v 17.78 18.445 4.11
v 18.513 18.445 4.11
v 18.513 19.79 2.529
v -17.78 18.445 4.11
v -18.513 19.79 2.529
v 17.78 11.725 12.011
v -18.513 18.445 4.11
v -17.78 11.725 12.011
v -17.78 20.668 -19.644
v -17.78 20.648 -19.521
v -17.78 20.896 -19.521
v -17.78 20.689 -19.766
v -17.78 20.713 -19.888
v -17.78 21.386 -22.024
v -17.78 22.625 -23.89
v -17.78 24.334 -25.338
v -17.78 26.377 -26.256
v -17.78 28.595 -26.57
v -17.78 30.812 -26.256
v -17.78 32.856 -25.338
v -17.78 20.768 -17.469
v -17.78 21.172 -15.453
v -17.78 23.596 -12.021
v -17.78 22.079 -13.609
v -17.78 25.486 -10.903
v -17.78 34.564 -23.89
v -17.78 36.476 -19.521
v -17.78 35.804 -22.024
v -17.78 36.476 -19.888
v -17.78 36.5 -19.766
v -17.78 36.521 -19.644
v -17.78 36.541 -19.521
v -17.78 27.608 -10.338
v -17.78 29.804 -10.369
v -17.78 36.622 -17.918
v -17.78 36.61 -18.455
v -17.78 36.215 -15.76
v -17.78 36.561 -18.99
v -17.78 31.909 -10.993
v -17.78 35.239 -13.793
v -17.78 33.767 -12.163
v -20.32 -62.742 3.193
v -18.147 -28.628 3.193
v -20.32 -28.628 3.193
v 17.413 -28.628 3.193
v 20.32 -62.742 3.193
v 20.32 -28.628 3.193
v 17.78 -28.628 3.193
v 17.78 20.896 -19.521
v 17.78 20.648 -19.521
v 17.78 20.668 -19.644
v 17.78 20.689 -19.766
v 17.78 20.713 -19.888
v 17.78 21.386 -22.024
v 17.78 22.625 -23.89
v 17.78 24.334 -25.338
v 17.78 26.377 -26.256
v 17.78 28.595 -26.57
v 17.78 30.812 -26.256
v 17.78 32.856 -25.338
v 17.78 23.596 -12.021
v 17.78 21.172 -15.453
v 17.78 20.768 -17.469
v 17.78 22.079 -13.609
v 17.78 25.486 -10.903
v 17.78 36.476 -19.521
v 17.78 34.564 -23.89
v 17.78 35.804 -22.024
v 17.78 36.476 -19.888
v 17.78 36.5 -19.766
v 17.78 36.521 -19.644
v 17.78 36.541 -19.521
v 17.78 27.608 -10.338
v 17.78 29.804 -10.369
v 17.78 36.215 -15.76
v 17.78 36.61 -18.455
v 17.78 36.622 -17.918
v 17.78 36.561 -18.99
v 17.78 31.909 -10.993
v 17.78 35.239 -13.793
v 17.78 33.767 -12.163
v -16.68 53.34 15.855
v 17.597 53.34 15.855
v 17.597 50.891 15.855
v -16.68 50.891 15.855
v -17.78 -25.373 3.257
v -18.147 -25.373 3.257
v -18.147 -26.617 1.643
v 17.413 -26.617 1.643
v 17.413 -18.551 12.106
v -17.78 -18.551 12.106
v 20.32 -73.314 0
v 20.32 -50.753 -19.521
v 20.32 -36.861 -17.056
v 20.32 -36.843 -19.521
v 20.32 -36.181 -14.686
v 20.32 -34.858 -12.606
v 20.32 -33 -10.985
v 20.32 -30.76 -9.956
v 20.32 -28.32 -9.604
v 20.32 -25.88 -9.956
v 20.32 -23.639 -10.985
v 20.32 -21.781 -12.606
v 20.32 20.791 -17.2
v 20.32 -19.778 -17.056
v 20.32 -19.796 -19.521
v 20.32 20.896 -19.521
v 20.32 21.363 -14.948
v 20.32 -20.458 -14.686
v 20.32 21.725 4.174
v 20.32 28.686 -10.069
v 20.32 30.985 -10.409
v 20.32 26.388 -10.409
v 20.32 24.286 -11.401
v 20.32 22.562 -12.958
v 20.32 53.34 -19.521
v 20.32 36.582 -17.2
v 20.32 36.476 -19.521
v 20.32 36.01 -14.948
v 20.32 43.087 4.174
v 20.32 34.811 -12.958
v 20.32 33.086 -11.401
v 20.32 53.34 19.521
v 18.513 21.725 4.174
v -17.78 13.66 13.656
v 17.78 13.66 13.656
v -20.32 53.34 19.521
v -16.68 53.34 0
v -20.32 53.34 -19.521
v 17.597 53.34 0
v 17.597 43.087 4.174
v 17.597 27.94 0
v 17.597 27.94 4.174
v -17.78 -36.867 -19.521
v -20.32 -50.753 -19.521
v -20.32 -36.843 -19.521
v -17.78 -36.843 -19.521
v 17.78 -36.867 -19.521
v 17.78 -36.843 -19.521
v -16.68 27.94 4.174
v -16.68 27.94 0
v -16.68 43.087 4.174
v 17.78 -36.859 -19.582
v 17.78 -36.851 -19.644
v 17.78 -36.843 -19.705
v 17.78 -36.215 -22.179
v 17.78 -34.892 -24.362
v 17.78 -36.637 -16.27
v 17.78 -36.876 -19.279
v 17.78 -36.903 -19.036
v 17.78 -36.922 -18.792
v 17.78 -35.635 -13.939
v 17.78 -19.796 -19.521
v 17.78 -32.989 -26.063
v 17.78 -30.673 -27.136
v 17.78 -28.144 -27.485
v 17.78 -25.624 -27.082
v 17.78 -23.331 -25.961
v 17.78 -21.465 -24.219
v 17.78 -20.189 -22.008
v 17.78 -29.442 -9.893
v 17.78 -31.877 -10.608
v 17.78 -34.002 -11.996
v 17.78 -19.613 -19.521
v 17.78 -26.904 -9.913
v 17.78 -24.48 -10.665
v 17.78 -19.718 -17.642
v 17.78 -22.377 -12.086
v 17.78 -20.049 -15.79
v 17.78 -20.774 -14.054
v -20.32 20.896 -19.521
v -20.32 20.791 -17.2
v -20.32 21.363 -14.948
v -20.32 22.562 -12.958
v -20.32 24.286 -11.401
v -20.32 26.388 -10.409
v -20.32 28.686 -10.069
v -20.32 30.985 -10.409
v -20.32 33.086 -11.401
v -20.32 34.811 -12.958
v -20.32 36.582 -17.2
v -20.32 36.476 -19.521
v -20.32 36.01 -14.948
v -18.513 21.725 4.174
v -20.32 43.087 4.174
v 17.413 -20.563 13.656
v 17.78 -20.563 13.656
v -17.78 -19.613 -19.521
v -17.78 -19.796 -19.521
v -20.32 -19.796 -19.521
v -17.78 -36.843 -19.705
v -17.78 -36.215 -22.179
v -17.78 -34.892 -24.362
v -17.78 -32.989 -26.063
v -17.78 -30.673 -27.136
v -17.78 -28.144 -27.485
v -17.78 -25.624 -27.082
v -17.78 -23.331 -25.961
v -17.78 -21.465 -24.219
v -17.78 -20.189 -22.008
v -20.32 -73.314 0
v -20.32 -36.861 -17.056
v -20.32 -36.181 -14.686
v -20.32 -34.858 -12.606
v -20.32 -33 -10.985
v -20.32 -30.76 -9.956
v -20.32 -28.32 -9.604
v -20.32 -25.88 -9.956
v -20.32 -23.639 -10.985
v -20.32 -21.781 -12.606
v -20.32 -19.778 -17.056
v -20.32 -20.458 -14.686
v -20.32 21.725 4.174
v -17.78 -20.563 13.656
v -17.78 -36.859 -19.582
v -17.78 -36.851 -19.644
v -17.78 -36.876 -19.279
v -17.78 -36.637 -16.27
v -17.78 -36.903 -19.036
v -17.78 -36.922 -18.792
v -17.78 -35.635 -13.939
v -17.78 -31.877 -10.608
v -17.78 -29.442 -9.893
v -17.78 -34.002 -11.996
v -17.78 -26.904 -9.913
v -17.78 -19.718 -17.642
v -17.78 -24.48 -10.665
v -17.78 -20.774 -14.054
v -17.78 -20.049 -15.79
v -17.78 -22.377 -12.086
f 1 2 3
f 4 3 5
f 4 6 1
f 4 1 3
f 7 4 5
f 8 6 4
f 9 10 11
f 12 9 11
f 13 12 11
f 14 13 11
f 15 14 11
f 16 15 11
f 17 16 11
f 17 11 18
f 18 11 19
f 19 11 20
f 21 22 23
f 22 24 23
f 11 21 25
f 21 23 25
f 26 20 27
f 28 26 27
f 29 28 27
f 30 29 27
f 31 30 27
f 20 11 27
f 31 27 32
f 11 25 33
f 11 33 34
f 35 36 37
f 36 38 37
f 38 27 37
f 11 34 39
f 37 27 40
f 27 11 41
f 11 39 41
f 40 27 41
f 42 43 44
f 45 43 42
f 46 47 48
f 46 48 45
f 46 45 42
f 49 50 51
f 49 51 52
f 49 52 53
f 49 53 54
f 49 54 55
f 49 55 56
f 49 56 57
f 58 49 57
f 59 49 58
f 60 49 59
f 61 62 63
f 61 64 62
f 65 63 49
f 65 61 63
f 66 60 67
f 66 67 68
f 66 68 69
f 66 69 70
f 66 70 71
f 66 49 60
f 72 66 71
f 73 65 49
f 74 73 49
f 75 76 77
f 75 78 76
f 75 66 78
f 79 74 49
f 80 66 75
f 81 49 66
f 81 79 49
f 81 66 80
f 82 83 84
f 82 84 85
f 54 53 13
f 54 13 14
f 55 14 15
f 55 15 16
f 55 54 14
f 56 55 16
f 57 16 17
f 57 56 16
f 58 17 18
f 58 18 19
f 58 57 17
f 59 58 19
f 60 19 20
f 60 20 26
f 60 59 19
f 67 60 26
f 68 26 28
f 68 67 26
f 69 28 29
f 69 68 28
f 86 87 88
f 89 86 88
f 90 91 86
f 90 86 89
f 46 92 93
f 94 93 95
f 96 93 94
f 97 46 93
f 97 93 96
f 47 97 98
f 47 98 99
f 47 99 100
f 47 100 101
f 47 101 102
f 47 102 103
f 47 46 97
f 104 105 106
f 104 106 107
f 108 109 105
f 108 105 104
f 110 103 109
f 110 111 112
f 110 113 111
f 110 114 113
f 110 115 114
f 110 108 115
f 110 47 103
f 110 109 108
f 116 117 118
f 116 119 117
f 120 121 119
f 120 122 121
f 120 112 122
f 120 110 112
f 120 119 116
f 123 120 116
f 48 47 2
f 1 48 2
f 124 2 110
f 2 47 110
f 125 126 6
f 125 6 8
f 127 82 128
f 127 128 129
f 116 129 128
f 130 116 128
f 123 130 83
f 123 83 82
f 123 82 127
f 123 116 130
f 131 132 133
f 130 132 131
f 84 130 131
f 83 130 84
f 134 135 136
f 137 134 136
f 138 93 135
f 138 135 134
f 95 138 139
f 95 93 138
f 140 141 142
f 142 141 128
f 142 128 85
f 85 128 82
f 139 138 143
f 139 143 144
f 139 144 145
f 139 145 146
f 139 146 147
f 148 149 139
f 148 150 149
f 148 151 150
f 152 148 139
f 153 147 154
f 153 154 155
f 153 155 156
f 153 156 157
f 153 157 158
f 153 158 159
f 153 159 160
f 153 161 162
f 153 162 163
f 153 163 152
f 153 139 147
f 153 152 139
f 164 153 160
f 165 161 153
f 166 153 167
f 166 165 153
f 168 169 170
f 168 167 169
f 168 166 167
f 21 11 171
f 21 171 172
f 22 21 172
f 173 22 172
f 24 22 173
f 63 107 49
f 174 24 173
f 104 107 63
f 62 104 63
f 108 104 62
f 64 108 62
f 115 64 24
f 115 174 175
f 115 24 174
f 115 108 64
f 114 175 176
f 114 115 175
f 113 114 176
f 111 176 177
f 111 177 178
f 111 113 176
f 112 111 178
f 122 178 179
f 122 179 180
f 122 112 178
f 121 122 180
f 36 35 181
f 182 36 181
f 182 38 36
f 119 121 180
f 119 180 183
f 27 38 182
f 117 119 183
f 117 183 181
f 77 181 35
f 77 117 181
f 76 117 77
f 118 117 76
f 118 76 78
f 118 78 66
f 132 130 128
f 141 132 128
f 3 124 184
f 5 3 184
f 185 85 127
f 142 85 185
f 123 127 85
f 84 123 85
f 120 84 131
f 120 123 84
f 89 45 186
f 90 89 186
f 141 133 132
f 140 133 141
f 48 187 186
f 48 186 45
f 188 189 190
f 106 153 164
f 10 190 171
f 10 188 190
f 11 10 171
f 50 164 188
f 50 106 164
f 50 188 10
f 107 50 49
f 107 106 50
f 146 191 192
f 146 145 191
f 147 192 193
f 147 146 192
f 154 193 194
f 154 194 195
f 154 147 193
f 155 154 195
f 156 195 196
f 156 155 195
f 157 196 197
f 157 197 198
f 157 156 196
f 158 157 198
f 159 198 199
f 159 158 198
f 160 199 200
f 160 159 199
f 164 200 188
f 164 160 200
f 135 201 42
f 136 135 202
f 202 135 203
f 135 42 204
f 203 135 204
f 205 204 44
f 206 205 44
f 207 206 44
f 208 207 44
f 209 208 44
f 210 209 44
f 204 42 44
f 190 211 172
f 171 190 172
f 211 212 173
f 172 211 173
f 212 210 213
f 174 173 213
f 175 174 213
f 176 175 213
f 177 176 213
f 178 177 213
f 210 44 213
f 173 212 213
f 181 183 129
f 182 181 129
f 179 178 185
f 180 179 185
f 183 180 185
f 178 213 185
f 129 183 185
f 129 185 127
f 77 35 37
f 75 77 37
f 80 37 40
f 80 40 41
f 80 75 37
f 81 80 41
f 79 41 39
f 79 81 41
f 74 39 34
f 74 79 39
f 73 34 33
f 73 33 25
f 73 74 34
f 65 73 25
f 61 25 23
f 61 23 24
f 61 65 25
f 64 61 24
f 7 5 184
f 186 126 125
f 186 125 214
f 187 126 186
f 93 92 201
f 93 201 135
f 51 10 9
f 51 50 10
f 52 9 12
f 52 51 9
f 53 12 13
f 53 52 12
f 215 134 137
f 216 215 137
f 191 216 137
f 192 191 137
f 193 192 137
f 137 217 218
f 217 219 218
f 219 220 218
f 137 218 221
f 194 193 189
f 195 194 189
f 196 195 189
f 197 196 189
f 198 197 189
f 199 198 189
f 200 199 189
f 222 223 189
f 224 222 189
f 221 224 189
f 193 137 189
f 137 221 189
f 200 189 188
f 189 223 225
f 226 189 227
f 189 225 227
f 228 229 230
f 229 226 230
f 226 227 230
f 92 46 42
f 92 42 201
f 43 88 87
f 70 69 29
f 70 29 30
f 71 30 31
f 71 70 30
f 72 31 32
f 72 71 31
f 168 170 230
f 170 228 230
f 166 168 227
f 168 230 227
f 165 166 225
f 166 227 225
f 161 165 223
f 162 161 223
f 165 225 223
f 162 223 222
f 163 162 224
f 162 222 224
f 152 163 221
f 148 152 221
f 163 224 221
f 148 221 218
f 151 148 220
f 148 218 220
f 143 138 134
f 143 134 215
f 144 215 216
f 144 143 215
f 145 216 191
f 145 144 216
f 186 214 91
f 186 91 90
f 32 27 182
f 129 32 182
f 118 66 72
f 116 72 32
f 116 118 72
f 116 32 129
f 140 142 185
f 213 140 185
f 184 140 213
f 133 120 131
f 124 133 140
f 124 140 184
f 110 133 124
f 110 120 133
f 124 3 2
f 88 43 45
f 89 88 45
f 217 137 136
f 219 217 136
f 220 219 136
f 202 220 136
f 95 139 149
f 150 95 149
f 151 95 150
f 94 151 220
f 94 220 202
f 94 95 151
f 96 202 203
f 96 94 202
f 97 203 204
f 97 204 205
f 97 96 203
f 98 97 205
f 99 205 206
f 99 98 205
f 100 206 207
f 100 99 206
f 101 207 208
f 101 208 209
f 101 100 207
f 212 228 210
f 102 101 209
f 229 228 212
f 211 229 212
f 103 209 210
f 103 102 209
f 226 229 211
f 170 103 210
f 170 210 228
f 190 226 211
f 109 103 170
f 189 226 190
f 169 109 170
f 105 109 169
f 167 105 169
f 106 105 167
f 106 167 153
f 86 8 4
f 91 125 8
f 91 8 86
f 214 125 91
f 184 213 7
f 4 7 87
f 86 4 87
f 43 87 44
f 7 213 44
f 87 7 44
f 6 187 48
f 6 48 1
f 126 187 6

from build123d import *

# Parameters (mm, degrees)
F1_DEPTH  = 45.72
F3_DEPTH  = 40.64
F5_DEPTH  = 25.4
F6_DEPTH  = 25.4
F7_DEPTH  = 25.4
F8_DEPTH  = 25.4
F9_DEPTH  = 2.54
F10_DEPTH = 2.54
F11_W     = 35.5600006878
F11_H     = 13.2107668169
F12_DEPTH = 2.54
F13_W     = 37.026392296
F13_H     = 12.4482874382
F14_DEPTH = 2.54
F17_DEPTH = 2.54
F18_DEPTH = 2.54
F19_W     = 34.2769082636
F19_H     = 15.8553607762
F20_DEPTH = 25.4


with BuildPart() as f1:
    # F0 (on Right) → F1 (new body)
    with BuildSketch(Plane.YZ):
        Polygon((-28.6284703761, 3.1933195423), (21.7250119895, 4.1742315516), (13.6597361416, 13.656382449), (-20.5631945282, 13.656382449), align=None)
        with BuildLine():
            Line((53.3399991691, -19.5213407278), (53.3399991691, 19.5213407278))
            Line((53.3399991691, 19.5213407278), (43.0870950222, 4.1742315516))
            Line((43.0870950222, 4.1742315516), (21.7250119895, 4.1742315516))
            Line((21.7250119895, 4.1742315516), (-28.6284703761, 3.1933195423))
            Line((-28.6284703761, 3.1933195423), (-62.7424120903, 3.1933195423))
            Line((-62.7424120903, 3.1933195423), (-73.3144581318, 0))
            Line((-73.3144581318, 0), (-50.7534816861, -19.5213407278))
            Line((-50.7534816861, -19.5213407278), (-36.8430949748, -19.5213407278))
            ThreePointArc((-36.8430949748, -19.5213407278), (-28.3196913078, -9.6037565649), (-19.7962876409, -19.5213407278))
            Line((-19.7962876409, -19.5213407278), (20.896082744, -19.5213407278))
            ThreePointArc((20.896082744, -19.5213407278), (28.6862896755, -10.0693031936), (36.4764966071, -19.5213407278))
            Line((36.4764966071, -19.5213407278), (53.3399991691, -19.5213407278))
        make_face()
    extrude(amount=F1_DEPTH)

    # F2 (on Right) → F3 (join)
    with BuildSketch(Plane.YZ):
        with BuildLine():
            ThreePointArc((20.7127835602, -19.8879390955), (28.5946400836, -26.5695137941), (36.4764966071, -19.8879390955))
            ThreePointArc((36.4764966071, -19.8879390955), (28.5946400836, -10.2776465209), (20.7127835602, -19.8879390955))
        make_face()
        with BuildLine():
            ThreePointArc((-36.8430912495, -19.704638049), (-28.1442910168, -27.4854506573), (-19.6129884571, -19.5213407278))
            ThreePointArc((-19.6129884571, -19.5213407278), (-28.3323258535, -9.8100174081), (-36.8430912495, -19.704638049))
        make_face()
    extrude(amount=F3_DEPTH)

    # F4: F1 across plane


with BuildPart() as f1_1:
    add(f1.part)
    add(f1.part.mirror(Plane.YZ))

    # F5 (cut): faces of the model
    f5_faces = [f1_1.faces().sort_by_distance(p)[0] for p in [
        (45.72, -3.0719009066, -4.1533515012),
        (40.64, -28.256328602, -18.6447266271),
    ]]
    extrude(f5_faces, amount=-F5_DEPTH, mode=Mode.SUBTRACT)

    # F6 (cut): a face of the model
    f6_faces = [f1_1.faces().sort_by_distance(p)[0] for p in [
        (40.64, 28.6216517019, -18.4204608425),
    ]]
    extrude(f6_faces, amount=-F6_DEPTH, mode=Mode.SUBTRACT)

    # F7 (cut): a face of the model
    f7_faces = [f1_1.faces().sort_by_distance(p)[0] for p in [
        (-45.72, -3.0719009066, -4.1533515012),
    ]]
    extrude(f7_faces, amount=-F7_DEPTH, mode=Mode.SUBTRACT)

    # F8 (cut): faces of the model
    f8_faces = [f1_1.faces().sort_by_distance(p)[0] for p in [
        (-40.64, 28.6216517019, -18.4204608425),
        (-40.64, -28.256328602, -18.6447266271),
    ]]
    extrude(f8_faces, amount=-F8_DEPTH, mode=Mode.SUBTRACT)

    # F9 (add): faces of the model
    f9_faces = [f1_1.faces().sort_by_distance(p)[0] for p in [
        (15.24, -28.256328602, -18.6447266271),
        (15.24, 28.6216517019, -18.4204608425),
    ]]
    extrude(f9_faces, amount=F9_DEPTH)

    # F10 (add): faces of the model
    f10_faces = [f1_1.faces().sort_by_distance(p)[0] for p in [
        (-15.24, 28.6216517019, -18.4204608425),
        (-15.24, -28.256328602, -18.6447266271),
    ]]
    extrude(f10_faces, amount=F10_DEPTH)

    # F11 (on face) → F12 (cut)
    with BuildSketch(Plane(origin=(0, -19.5021350286, 15.0328923789), x_dir=(1, 0, 0), z_dir=(0, -0.7920102634, 0.6105077744))):
        with Locations((-0.3665983677, -8.3433784743)):
            Rectangle(F11_W, F11_H)
    extrude(amount=-F12_DEPTH, mode=Mode.SUBTRACT)

    # F13 (on face) → F14 (cut)
    with BuildSketch(Plane(origin=(0, 14.6654159011, 12.4740289357), x_dir=(-1, 0, 0), z_dir=(0, 0.761723325, 0.6479024434))):
        with Locations((9.313e-07, -4.6719350962)):
            Rectangle(F13_W, F13_H)
    extrude(amount=-F14_DEPTH, mode=Mode.SUBTRACT)

    # F16 (on face) → F17 (cut)
    with BuildSketch(Plane(origin=(-20.32, 0, 0), x_dir=(0, -1, 0), z_dir=(-1, 0, 0))):
        Polygon((-13.6597361416, 13.656382449), (-21.7250119895, 4.1742315516), (28.6284703761, 3.1933195423), (20.5631945282, 13.656382449), align=None)
    extrude(amount=-F17_DEPTH, mode=Mode.SUBTRACT)

    # F15 (on face) → F18 (cut)
    with BuildSketch(Plane.YZ.offset(20.32)):
        Polygon((-20.5631945282, 13.656382449), (-28.6284703761, 3.1933195423), (21.7250119895, 4.1742315516), (13.6597361416, 13.656382449), align=None)
    extrude(amount=-F18_DEPTH, mode=Mode.SUBTRACT)

    # F19 (on face) → F20 (cut)
    with BuildSketch(Plane(origin=(0, 53.3399991691, 0), x_dir=(-1, 0, 0), z_dir=(0, 1, 0))):
        with Locations((-0.4582470283, 7.9276803881)):
            Rectangle(F19_W, F19_H)
    extrude(amount=-F20_DEPTH, mode=Mode.SUBTRACT)


solid = f1_1.part
